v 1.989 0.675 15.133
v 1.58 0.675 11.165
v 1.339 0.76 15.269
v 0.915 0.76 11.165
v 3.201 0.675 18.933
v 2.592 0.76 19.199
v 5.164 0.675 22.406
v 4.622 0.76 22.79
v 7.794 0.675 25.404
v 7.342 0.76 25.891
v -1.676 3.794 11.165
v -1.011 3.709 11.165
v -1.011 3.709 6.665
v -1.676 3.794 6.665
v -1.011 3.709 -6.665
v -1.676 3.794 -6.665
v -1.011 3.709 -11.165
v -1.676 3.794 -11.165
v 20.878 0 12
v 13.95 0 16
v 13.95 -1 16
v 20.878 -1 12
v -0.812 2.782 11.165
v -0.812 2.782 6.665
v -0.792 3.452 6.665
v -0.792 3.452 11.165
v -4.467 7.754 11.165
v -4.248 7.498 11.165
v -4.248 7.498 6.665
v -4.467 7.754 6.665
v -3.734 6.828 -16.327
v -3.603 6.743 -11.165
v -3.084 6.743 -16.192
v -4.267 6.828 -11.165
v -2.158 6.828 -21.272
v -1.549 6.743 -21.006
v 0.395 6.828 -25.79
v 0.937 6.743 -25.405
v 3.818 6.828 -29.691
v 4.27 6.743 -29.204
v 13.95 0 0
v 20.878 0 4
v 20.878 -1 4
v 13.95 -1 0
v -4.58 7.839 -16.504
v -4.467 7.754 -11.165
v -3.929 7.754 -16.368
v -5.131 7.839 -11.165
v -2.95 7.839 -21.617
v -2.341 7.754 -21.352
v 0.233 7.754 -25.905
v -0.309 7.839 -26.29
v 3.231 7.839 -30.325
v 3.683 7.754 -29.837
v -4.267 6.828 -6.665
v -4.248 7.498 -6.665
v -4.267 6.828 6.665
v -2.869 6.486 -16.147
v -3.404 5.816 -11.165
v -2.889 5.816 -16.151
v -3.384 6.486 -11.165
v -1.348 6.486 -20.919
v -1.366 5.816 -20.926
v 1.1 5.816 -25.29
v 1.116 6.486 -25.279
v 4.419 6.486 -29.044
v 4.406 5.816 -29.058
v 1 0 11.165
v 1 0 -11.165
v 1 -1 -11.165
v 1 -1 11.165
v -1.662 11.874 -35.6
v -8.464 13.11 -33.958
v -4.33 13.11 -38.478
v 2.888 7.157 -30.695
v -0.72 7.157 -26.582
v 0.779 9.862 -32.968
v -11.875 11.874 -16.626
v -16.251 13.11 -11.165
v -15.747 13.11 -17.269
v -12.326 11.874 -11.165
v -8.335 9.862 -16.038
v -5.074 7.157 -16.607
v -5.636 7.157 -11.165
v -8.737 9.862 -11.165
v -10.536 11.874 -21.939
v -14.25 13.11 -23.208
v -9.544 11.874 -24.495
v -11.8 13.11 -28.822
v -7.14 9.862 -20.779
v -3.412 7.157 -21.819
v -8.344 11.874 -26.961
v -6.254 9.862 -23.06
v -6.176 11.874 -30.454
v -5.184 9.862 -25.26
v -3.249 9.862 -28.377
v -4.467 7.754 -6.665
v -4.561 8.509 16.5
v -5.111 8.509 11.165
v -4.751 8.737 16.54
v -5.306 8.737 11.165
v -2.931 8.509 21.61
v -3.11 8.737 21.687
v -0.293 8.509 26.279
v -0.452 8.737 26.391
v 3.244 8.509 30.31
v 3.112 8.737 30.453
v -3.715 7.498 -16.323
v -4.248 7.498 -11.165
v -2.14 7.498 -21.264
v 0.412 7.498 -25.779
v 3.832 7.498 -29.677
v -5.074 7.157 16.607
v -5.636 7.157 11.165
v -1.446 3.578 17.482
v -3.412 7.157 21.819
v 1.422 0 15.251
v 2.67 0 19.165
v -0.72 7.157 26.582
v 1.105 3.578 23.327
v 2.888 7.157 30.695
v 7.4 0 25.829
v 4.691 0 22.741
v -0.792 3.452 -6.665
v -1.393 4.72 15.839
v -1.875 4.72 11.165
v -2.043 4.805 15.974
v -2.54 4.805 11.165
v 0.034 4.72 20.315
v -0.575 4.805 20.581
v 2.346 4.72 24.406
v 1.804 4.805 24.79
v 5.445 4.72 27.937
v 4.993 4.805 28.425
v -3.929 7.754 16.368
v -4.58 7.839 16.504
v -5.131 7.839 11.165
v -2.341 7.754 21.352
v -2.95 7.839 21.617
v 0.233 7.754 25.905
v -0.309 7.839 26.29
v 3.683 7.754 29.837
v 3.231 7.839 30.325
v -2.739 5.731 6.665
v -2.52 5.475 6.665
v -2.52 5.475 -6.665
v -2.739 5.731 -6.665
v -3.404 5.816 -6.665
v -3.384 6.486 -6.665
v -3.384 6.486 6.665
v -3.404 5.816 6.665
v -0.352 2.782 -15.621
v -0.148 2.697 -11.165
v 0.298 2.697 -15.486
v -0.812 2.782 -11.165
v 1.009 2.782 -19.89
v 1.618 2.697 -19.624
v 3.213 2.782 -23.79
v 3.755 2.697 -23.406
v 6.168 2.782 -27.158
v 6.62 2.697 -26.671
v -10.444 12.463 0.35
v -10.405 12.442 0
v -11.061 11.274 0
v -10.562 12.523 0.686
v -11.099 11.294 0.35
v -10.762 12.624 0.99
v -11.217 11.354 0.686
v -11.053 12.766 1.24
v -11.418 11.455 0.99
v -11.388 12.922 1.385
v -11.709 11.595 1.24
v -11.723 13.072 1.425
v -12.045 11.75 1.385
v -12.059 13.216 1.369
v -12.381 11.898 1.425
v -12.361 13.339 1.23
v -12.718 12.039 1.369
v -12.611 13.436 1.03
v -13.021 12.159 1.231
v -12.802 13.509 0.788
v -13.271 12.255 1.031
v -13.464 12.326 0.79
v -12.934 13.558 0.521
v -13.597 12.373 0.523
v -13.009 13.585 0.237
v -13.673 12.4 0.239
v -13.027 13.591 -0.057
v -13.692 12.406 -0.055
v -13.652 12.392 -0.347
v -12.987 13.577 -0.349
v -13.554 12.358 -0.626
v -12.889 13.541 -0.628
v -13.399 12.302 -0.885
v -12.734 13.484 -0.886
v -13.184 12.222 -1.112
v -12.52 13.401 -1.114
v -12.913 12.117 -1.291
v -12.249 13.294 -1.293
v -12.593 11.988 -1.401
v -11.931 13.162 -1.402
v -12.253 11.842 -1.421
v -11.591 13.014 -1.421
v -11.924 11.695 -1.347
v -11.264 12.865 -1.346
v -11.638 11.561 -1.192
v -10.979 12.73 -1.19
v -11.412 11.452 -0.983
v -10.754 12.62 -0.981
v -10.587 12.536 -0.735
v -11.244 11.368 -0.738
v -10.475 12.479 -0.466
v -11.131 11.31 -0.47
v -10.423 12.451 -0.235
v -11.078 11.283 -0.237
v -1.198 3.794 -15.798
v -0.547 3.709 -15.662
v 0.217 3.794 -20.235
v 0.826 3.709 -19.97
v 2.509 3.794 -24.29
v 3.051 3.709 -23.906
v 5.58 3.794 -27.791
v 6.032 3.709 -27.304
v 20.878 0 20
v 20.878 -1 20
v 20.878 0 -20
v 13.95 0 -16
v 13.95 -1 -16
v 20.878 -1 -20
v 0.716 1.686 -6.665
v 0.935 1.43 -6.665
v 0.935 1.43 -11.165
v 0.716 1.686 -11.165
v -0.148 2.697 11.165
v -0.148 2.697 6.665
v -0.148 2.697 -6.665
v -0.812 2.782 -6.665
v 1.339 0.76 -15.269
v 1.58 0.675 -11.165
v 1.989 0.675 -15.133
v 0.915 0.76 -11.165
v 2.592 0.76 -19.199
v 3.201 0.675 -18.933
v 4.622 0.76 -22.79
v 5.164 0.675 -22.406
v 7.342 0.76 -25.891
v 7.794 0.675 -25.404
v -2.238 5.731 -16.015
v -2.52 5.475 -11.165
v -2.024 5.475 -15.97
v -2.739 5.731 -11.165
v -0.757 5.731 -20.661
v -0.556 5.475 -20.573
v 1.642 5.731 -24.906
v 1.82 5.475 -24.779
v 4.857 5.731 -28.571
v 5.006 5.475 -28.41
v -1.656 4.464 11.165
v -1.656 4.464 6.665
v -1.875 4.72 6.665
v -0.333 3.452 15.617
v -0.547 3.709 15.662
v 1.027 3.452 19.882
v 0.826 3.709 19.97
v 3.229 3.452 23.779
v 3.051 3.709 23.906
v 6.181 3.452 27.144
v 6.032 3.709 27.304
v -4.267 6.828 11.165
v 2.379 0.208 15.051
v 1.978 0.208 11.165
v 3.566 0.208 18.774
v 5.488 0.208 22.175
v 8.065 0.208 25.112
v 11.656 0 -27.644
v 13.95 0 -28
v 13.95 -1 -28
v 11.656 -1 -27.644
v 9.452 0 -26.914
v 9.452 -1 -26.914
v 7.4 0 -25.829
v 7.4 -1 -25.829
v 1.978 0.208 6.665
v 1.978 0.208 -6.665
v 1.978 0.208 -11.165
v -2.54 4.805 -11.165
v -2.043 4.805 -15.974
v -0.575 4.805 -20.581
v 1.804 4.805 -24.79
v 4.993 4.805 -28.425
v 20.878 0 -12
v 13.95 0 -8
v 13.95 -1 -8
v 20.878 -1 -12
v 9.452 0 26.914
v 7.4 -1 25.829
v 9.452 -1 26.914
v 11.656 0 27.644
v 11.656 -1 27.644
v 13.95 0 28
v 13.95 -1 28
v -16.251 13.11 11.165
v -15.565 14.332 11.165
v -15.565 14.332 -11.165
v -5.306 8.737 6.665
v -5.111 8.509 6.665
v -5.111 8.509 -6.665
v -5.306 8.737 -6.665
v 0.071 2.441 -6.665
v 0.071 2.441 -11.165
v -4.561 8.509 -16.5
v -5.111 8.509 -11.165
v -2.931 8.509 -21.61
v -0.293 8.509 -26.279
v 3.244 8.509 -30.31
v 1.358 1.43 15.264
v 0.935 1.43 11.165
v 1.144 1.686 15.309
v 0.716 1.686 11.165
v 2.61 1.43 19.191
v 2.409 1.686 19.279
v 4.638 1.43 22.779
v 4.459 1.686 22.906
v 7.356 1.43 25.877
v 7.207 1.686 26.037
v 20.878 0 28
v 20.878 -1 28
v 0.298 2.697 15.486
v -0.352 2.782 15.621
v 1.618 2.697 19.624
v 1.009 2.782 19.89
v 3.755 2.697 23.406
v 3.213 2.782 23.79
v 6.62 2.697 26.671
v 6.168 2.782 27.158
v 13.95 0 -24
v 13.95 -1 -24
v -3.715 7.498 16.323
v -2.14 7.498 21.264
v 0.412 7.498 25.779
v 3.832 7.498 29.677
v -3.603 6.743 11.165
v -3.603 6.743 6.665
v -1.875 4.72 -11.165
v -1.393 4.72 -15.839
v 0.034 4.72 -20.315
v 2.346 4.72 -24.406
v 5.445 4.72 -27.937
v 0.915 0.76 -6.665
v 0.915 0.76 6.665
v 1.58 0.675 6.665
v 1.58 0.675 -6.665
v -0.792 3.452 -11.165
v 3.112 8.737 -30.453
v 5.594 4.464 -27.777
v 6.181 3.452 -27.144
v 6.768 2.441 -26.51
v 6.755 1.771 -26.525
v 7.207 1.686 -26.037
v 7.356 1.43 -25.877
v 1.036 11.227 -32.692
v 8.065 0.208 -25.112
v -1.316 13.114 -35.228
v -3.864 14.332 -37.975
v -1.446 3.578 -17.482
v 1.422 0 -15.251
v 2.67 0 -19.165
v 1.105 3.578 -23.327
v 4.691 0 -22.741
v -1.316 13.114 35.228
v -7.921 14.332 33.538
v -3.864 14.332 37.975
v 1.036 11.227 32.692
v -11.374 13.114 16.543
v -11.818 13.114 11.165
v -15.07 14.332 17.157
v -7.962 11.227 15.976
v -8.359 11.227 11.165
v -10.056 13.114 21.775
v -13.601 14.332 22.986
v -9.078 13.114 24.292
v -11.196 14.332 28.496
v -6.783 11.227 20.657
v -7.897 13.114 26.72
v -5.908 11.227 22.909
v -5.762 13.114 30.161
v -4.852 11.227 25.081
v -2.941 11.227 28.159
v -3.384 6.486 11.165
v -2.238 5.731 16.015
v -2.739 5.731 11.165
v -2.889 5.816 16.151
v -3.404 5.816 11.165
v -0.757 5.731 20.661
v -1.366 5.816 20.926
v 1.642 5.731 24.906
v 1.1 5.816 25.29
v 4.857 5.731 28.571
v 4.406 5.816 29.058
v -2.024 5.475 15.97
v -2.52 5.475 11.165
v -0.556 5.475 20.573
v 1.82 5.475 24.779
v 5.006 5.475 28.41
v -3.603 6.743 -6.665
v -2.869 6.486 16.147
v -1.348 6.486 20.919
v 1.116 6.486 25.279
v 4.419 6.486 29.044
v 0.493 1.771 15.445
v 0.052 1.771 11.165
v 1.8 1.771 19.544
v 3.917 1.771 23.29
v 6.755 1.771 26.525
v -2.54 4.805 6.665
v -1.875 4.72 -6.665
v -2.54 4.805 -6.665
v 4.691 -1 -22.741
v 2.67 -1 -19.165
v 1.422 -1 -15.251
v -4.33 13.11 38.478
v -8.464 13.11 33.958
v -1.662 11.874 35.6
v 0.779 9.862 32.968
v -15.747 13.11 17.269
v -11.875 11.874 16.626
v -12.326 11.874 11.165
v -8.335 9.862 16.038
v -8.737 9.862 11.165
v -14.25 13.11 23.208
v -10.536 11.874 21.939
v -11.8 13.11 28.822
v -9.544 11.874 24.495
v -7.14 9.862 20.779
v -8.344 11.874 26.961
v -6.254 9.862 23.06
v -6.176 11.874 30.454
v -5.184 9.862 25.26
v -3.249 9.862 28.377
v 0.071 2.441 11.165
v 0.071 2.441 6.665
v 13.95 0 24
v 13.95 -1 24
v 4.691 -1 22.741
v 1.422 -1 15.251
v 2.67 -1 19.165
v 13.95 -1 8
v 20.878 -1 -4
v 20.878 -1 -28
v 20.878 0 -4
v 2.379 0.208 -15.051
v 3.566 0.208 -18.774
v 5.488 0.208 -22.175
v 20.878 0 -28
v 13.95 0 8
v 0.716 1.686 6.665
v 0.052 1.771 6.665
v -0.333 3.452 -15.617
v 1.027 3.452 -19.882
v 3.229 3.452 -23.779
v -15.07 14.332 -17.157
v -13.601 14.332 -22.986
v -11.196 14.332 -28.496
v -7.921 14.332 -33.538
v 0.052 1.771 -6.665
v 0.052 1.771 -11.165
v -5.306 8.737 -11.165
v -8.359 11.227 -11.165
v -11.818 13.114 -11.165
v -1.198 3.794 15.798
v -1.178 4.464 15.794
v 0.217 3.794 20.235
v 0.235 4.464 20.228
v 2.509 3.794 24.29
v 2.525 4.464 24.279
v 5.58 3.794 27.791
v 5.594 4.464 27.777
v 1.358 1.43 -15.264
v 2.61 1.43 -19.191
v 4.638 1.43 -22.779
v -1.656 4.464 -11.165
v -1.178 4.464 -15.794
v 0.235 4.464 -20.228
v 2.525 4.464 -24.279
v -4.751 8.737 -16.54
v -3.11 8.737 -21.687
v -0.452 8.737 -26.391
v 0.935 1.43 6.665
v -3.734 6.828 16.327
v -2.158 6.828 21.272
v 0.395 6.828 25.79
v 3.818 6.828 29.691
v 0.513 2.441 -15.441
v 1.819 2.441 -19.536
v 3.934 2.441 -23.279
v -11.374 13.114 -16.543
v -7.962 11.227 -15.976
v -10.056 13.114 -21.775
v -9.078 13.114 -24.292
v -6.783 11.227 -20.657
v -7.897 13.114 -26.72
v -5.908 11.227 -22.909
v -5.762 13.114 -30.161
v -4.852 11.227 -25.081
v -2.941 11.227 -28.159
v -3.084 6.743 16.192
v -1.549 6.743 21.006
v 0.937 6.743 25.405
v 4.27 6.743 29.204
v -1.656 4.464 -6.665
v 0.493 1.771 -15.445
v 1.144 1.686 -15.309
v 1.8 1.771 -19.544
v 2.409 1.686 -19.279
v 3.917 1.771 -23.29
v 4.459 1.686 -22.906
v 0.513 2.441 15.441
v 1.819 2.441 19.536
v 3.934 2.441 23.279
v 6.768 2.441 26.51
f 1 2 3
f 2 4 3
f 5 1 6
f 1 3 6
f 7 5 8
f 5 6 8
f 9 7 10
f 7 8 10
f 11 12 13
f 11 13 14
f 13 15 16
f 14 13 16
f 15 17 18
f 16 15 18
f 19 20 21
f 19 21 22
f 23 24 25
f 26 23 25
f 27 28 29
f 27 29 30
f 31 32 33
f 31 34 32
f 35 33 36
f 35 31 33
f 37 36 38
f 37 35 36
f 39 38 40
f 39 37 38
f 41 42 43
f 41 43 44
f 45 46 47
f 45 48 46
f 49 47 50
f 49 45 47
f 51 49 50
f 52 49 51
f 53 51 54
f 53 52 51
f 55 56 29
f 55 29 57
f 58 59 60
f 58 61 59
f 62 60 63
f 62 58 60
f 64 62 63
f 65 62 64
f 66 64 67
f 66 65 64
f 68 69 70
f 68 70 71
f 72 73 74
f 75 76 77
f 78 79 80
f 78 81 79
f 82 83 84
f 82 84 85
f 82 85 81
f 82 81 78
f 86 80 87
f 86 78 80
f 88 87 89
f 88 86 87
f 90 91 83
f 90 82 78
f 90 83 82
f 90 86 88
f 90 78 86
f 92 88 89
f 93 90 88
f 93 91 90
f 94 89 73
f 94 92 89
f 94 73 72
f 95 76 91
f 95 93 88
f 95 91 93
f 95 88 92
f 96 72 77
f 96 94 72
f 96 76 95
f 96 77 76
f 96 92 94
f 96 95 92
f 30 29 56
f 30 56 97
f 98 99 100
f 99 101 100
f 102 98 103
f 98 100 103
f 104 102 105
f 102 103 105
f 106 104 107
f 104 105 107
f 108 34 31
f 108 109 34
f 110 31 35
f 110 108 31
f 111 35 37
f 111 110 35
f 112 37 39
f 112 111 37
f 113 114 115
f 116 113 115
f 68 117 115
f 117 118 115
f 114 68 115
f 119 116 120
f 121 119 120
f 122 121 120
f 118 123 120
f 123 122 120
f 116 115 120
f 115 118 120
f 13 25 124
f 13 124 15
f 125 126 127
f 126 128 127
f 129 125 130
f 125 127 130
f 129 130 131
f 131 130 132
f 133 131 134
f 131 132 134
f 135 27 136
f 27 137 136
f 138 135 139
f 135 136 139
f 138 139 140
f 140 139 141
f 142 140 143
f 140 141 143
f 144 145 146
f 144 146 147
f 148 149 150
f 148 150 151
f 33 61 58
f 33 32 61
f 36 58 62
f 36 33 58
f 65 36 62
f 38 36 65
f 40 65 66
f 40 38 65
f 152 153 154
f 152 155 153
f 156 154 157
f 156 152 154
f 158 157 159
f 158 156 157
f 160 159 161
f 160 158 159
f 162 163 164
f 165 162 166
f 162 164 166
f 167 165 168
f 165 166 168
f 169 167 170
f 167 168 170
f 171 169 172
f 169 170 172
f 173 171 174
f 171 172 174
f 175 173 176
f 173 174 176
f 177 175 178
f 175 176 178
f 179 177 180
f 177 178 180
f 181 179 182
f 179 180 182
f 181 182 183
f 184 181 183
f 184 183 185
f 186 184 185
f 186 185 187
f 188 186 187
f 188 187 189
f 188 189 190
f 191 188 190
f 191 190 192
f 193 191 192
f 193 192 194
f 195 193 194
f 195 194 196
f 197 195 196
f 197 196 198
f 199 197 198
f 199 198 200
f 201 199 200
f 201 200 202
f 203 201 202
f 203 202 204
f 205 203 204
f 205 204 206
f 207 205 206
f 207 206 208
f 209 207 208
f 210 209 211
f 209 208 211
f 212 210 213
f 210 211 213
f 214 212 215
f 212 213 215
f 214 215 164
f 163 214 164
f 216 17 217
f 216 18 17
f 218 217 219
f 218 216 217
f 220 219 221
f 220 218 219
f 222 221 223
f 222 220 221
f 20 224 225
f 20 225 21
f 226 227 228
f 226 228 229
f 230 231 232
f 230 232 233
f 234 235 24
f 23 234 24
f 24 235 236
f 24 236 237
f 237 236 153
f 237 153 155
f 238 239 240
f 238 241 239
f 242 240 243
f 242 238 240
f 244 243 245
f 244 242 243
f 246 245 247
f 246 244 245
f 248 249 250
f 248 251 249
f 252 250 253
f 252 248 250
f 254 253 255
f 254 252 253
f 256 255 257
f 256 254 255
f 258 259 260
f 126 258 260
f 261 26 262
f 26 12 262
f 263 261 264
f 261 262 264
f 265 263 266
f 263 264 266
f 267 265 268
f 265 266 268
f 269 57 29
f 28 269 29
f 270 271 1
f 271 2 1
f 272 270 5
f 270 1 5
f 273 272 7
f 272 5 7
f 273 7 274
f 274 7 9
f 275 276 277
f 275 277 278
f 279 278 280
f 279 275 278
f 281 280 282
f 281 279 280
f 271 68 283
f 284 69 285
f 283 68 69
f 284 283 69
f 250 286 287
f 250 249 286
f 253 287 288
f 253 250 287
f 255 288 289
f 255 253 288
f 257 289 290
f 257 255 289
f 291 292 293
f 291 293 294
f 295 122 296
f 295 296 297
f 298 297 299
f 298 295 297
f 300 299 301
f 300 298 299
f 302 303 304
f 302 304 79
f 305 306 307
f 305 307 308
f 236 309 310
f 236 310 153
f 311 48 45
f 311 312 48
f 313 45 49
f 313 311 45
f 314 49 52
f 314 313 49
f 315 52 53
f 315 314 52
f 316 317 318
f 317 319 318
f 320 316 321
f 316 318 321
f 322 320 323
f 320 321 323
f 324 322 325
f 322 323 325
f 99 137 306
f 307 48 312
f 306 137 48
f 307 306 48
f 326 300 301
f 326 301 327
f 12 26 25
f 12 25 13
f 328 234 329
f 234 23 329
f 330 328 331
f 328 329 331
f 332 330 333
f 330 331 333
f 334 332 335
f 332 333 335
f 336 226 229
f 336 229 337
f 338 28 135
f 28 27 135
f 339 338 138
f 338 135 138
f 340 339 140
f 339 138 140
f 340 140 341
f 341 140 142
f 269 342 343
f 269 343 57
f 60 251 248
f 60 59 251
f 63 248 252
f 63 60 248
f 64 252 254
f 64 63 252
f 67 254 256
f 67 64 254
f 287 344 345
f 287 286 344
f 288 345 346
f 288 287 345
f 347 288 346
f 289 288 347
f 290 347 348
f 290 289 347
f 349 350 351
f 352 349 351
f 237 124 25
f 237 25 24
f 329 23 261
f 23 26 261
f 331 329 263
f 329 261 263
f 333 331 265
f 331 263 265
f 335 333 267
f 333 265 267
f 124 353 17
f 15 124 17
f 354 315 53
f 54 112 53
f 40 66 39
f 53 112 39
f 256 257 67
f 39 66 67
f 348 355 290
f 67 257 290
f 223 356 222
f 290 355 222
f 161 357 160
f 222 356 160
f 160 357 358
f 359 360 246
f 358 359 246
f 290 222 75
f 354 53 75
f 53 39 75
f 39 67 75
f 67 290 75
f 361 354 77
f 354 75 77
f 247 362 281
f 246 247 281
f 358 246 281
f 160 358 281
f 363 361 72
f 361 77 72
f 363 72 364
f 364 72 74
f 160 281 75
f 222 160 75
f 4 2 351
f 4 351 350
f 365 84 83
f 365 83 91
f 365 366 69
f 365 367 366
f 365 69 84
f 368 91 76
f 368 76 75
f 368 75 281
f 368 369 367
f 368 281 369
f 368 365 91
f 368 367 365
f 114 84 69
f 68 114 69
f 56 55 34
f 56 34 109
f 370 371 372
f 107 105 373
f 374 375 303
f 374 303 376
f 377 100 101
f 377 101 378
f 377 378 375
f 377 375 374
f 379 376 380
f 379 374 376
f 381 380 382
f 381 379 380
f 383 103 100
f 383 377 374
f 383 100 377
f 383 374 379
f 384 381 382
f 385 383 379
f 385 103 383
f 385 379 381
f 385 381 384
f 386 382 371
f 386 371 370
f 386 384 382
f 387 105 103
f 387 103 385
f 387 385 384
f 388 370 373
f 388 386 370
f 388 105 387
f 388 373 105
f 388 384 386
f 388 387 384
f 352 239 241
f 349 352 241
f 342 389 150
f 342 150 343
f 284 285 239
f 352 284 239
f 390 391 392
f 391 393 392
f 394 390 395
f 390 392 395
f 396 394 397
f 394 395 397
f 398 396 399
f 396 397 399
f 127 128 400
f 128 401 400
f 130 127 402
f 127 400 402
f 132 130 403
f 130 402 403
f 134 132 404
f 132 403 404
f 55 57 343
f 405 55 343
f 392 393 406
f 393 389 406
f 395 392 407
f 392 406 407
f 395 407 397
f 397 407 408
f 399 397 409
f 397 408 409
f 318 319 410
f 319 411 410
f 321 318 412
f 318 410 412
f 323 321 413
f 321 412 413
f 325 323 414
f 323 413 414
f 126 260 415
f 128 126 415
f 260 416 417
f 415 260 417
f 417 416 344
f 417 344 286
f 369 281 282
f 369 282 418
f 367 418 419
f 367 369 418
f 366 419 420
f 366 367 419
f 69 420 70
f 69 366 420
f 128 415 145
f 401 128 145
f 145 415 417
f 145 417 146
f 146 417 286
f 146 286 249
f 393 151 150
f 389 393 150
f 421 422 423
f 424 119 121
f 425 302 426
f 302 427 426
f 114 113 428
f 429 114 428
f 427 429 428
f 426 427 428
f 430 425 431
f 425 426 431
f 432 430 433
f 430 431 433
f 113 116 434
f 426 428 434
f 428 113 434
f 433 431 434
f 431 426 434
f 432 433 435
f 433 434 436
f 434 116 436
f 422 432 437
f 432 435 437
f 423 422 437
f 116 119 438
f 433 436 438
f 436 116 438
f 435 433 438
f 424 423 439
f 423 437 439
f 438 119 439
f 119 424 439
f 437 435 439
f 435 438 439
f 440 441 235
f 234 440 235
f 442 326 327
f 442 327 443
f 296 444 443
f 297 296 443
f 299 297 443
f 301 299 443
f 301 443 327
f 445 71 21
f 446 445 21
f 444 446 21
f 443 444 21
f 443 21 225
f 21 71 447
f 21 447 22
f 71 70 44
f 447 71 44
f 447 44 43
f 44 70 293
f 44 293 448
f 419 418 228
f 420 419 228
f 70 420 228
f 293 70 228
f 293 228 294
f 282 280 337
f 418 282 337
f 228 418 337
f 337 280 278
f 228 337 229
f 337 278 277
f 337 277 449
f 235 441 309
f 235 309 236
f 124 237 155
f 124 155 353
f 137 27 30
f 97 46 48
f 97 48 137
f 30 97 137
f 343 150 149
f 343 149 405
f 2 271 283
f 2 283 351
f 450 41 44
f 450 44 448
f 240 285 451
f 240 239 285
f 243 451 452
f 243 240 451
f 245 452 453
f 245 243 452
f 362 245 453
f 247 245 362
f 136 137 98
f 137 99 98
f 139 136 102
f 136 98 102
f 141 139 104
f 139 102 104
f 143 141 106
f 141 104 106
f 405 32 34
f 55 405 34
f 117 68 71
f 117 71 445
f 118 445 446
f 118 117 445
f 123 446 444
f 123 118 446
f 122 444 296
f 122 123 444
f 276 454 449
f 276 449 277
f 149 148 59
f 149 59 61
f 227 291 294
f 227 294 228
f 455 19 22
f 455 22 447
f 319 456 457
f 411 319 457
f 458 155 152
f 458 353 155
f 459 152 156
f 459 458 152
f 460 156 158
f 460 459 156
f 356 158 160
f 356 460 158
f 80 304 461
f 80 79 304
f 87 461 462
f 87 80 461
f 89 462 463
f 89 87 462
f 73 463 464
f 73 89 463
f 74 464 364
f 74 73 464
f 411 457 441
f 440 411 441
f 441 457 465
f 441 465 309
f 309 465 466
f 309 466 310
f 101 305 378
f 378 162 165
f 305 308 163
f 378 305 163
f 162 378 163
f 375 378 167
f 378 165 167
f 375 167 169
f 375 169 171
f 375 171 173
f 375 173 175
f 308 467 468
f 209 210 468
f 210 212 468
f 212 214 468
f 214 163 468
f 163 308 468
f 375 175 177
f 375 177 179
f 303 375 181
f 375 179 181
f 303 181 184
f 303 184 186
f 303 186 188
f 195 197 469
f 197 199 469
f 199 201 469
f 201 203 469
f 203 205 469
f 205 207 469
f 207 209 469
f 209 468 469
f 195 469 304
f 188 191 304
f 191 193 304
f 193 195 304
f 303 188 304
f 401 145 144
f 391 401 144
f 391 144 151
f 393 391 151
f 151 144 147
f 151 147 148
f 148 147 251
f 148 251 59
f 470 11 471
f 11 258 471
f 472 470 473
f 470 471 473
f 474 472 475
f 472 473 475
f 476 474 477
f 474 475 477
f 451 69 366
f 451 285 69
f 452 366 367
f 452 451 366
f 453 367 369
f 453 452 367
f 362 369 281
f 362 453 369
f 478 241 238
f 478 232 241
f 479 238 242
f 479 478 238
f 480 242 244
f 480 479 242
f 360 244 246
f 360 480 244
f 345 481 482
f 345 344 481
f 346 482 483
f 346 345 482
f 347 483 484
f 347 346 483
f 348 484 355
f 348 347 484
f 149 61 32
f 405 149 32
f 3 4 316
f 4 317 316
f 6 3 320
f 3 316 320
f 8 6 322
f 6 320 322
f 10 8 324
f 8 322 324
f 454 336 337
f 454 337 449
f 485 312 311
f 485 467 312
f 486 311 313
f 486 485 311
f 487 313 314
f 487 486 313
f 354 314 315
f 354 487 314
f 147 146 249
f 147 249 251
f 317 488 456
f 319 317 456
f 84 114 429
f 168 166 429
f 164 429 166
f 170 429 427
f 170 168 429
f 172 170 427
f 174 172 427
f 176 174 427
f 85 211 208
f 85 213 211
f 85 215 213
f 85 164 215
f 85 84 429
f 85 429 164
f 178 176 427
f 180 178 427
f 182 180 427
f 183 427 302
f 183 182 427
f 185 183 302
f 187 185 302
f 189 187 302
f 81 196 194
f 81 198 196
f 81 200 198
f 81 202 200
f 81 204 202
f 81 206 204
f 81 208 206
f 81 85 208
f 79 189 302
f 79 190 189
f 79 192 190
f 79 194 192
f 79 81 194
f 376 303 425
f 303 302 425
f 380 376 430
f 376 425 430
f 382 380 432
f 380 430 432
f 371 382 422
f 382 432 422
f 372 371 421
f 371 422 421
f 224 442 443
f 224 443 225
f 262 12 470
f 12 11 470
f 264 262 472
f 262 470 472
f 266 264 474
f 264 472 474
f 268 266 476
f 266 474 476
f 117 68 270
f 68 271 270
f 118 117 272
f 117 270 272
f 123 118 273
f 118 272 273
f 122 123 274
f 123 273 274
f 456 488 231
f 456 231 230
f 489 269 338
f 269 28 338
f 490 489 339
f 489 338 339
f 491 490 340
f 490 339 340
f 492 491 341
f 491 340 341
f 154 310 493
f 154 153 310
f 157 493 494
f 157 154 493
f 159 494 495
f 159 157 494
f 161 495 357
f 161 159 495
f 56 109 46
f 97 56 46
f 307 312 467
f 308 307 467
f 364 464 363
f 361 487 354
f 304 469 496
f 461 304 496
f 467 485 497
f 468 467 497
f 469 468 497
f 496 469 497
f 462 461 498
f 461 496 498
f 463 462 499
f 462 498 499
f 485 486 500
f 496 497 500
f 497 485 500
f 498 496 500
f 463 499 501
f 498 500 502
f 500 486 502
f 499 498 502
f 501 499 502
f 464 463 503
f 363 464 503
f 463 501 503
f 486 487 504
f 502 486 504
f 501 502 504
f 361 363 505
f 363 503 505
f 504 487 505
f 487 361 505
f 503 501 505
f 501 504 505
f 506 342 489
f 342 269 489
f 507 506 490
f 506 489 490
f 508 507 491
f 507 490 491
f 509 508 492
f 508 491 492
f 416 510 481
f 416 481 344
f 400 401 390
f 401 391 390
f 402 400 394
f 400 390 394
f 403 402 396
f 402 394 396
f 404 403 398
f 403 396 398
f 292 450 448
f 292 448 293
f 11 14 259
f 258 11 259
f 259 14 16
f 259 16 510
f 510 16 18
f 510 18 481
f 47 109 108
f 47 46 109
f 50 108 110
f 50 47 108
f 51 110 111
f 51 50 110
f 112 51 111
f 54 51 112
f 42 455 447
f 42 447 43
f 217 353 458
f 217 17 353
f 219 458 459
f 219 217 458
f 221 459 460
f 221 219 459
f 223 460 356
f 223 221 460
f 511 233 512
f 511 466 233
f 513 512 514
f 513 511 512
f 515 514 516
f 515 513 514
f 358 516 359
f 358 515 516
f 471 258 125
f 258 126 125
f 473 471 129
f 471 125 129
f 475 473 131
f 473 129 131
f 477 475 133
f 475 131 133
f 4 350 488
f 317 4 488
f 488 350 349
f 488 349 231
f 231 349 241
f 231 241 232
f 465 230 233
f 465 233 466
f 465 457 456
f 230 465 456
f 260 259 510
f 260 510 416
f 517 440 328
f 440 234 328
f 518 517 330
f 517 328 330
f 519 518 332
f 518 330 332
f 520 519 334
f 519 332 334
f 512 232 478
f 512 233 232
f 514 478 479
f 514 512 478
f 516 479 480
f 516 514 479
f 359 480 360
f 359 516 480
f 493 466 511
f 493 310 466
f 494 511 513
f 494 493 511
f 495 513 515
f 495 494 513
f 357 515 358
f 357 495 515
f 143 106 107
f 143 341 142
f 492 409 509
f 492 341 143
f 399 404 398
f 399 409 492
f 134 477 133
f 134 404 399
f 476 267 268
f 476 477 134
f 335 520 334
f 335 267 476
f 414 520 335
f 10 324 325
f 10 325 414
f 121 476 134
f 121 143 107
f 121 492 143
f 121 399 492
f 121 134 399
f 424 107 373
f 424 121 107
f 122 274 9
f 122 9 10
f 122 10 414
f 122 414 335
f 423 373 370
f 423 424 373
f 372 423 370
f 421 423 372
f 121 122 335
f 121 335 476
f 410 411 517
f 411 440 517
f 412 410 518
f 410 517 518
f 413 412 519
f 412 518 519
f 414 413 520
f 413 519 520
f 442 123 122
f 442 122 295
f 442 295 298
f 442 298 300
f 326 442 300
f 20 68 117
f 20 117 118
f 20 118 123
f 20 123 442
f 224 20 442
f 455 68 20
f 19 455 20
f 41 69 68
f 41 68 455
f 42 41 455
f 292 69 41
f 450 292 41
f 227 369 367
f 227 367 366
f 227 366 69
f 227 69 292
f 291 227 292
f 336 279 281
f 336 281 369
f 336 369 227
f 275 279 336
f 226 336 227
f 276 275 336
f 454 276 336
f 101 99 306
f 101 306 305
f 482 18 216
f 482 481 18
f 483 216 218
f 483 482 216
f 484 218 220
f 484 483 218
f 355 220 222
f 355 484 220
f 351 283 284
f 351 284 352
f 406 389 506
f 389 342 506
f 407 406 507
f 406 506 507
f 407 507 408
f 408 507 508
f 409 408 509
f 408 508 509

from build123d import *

# Parameters (mm, degrees)
BOSS_EXTRUDE1_DEPTH = 6.665
CUT_EXTRUDE2_DEPTH  = 26.439635203
LPATTERN1_COUNT     = 8
LPATTERN1_PITCH     = 1.33
BOSS_EXTRUDE2_DEPTH = 1
SKETCH11_R          = 1.425
CUT_EXTRUDE4_DEPTH  = 72.832856437


with BuildPart() as part:
    # Sketch1 → Boss-Extrude1 (new, symmetric)
    with BuildSketch(Plane.XY):
        with BuildLine():
            Line((-5.635928665, 7.156958206), (1, 0))
            Line((1, 0), (1.978038604, 0.208423819))
            Line((1.978038604, 0.208423819), (-5.306204433, 8.736958206))
            ThreePointArc((-5.306204433, 8.736958206), (-10.044936575, 12.250309514), (-15.564524684, 14.33198356))
            Line((-15.564524684, 14.33198356), (-16.250550344, 13.11))
            ThreePointArc((-16.250550344, 13.11), (-10.479442469, 10.960456342), (-5.635928665, 7.156958206))
        make_face()
    extrude(amount=BOSS_EXTRUDE1_DEPTH, both=True)

    # Sketch2 → Cut-Extrude2 (cut, symmetric)
    with BuildSketch(Plane.XY.offset(6.665)):
        Polygon((-3.982294286, 46.704559607), (-5.111367134, 8.50883888), (-5.131163815, 7.839131413), (-4.46660252, 7.753935845), (33.435614326, 2.894939498), (91.54886787, 52.52961802), (54.130959258, 96.339238129), align=None)
    cut_extrude2 = extrude(amount=CUT_EXTRUDE2_DEPTH, both=True, mode=Mode.SUBTRACT)

    # LPattern1: Cut-Extrude2 ×8
    with Locations(*[Vector(0.6494576652092012, -0.7603977519042342, 0) * (i * LPATTERN1_PITCH) for i in range(1, LPATTERN1_COUNT)]):
        add(cut_extrude2, mode=Mode.SUBTRACT)

    # Sweep1: sweep along a path in Sketch5
    with BuildLine(Plane(origin=(0, 0, 0), x_dir=(1, 0, 0), z_dir=(0, 1, 0))) as sweep1_path:
        Line((1, -6.665), (1, -11.165))
        ThreePointArc((1, -11.165), (2.66969722, -19.165), (7.4, -25.829242224))
    # Sketch3 → Sweep1 (sweep)
    with BuildSketch(Plane.XY.offset(6.665)):
        with BuildLine():
            Line((-5.111367134, 8.50883888), (-5.306204433, 8.736958206))
            ThreePointArc((-5.306204433, 8.736958206), (-10.044936575, 12.250309514), (-15.564524684, 14.33198356))
            Line((-15.564524684, 14.33198356), (-16.250550344, 13.11))
            ThreePointArc((-16.250550344, 13.11), (-10.479442469, 10.960456342), (-5.635928665, 7.156958206))
            Line((-5.635928665, 7.156958206), (1, 0))
            Line((1, 0), (1.978038604, 0.208423819))
            Line((1.978038604, 0.208423819), (1.579848343, 0.674632774))
            Line((1.579848343, 0.674632774), (0.915287048, 0.759828343))
            Line((0.915287048, 0.759828343), (0.935083729, 1.42953581))
            Line((0.935083729, 1.42953581), (0.716069648, 1.685961784))
            Line((0.716069648, 1.685961784), (0.051508353, 1.771157353))
            Line((0.051508353, 1.771157353), (0.071305034, 2.44086482))
            Line((0.071305034, 2.44086482), (-0.147709047, 2.697290795))
            Line((-0.147709047, 2.697290795), (-0.812270342, 2.782486363))
            Line((-0.812270342, 2.782486363), (-0.79247366, 3.45219383))
            Line((-0.79247366, 3.45219383), (-1.011487741, 3.708619805))
            Line((-1.011487741, 3.708619805), (-1.676049036, 3.793815373))
            Line((-1.676049036, 3.793815373), (-1.656252355, 4.46352284))
            Line((-1.656252355, 4.46352284), (-1.875266436, 4.719948815))
            Line((-1.875266436, 4.719948815), (-2.539827731, 4.805144383))
            Line((-2.539827731, 4.805144383), (-2.52003105, 5.47485185))
            Line((-2.52003105, 5.47485185), (-2.739045131, 5.731277825))
            Line((-2.739045131, 5.731277825), (-3.403606426, 5.816473393))
            Line((-3.403606426, 5.816473393), (-3.383809744, 6.48618086))
            Line((-3.383809744, 6.48618086), (-3.602823825, 6.742606835))
            Line((-3.602823825, 6.742606835), (-4.267385121, 6.827802403))
            Line((-4.267385121, 6.827802403), (-4.247588439, 7.49750987))
            Line((-4.247588439, 7.49750987), (-4.46660252, 7.753935845))
            Line((-4.46660252, 7.753935845), (-5.131163815, 7.839131413))
            Line((-5.131163815, 7.839131413), (-5.111367134, 8.50883888))
        make_face()
    sweep1 = sweep(path=sweep1_path.line)

    # Mirror1: Sweep1 across plane
    add(sweep1.mirror(Plane.XY))

    # Sketch11 → Cut-Extrude4 (cut, through all)
    with BuildSketch(Plane(origin=(-18.047616148, -32.18946836, 0), x_dir=(-0.8722573757239734, 0.48904710457697953, 0), z_dir=(-0.4890471045769795, -0.8722573757239733, 0))):
        with Locations(Location((16.586069938, 0, 0), (0, 0, 180))):
            Circle(SKETCH11_R)
    extrude(amount=-CUT_EXTRUDE4_DEPTH, mode=Mode.SUBTRACT)


with BuildPart() as body_2:
    # Sketch9 → Boss-Extrude2 (new body)
    with BuildSketch(Plane(origin=(0, 0, 0), x_dir=(1, 0, 0), z_dir=(0, 1, 0))):
        with BuildLine():
            Line((13.949642027, -24), (20.877845257, -20))
            Line((20.877845257, -20), (13.949642027, -16))
            Line((13.949642027, -16), (20.877845257, -12))
            Line((20.877845257, -12), (13.949642027, -8))
            Line((13.949642027, -8), (20.877845257, -4))
            Line((20.877845257, -4), (13.949642027, 0))
            Line((13.949642027, 0), (20.877845257, 4))
            Line((20.877845257, 4), (13.949642027, 8))
            Line((13.949642027, 8), (20.877845257, 12))
            Line((20.877845257, 12), (13.949642027, 16))
            Line((13.949642027, 16), (20.877845257, 20))
            Line((20.877845257, 20), (13.949642027, 24))
            Line((13.949642027, 24), (20.877845257, 28))
            Line((20.877845257, 28), (13.949642027, 28))
            ThreePointArc((13.949642027, 28), (10.538992417, 27.324445134), (7.4, 25.829242224))
            ThreePointArc((7.4, 25.829242224), (2.66969722, 19.165), (1, 11.165))
            Line((1, 11.165), (1, -11.165))
            ThreePointArc((1, -11.165), (2.66969722, -19.165), (7.4, -25.829242224))
            ThreePointArc((7.4, -25.829242224), (10.538992417, -27.324445134), (13.949642027, -28))
            Line((13.949642027, -28), (20.877845257, -28))
            Line((20.877845257, -28), (13.949642027, -24))
        make_face()
    extrude(amount=-BOSS_EXTRUDE2_DEPTH)


solid = Compound([part.part, body_2.part])
